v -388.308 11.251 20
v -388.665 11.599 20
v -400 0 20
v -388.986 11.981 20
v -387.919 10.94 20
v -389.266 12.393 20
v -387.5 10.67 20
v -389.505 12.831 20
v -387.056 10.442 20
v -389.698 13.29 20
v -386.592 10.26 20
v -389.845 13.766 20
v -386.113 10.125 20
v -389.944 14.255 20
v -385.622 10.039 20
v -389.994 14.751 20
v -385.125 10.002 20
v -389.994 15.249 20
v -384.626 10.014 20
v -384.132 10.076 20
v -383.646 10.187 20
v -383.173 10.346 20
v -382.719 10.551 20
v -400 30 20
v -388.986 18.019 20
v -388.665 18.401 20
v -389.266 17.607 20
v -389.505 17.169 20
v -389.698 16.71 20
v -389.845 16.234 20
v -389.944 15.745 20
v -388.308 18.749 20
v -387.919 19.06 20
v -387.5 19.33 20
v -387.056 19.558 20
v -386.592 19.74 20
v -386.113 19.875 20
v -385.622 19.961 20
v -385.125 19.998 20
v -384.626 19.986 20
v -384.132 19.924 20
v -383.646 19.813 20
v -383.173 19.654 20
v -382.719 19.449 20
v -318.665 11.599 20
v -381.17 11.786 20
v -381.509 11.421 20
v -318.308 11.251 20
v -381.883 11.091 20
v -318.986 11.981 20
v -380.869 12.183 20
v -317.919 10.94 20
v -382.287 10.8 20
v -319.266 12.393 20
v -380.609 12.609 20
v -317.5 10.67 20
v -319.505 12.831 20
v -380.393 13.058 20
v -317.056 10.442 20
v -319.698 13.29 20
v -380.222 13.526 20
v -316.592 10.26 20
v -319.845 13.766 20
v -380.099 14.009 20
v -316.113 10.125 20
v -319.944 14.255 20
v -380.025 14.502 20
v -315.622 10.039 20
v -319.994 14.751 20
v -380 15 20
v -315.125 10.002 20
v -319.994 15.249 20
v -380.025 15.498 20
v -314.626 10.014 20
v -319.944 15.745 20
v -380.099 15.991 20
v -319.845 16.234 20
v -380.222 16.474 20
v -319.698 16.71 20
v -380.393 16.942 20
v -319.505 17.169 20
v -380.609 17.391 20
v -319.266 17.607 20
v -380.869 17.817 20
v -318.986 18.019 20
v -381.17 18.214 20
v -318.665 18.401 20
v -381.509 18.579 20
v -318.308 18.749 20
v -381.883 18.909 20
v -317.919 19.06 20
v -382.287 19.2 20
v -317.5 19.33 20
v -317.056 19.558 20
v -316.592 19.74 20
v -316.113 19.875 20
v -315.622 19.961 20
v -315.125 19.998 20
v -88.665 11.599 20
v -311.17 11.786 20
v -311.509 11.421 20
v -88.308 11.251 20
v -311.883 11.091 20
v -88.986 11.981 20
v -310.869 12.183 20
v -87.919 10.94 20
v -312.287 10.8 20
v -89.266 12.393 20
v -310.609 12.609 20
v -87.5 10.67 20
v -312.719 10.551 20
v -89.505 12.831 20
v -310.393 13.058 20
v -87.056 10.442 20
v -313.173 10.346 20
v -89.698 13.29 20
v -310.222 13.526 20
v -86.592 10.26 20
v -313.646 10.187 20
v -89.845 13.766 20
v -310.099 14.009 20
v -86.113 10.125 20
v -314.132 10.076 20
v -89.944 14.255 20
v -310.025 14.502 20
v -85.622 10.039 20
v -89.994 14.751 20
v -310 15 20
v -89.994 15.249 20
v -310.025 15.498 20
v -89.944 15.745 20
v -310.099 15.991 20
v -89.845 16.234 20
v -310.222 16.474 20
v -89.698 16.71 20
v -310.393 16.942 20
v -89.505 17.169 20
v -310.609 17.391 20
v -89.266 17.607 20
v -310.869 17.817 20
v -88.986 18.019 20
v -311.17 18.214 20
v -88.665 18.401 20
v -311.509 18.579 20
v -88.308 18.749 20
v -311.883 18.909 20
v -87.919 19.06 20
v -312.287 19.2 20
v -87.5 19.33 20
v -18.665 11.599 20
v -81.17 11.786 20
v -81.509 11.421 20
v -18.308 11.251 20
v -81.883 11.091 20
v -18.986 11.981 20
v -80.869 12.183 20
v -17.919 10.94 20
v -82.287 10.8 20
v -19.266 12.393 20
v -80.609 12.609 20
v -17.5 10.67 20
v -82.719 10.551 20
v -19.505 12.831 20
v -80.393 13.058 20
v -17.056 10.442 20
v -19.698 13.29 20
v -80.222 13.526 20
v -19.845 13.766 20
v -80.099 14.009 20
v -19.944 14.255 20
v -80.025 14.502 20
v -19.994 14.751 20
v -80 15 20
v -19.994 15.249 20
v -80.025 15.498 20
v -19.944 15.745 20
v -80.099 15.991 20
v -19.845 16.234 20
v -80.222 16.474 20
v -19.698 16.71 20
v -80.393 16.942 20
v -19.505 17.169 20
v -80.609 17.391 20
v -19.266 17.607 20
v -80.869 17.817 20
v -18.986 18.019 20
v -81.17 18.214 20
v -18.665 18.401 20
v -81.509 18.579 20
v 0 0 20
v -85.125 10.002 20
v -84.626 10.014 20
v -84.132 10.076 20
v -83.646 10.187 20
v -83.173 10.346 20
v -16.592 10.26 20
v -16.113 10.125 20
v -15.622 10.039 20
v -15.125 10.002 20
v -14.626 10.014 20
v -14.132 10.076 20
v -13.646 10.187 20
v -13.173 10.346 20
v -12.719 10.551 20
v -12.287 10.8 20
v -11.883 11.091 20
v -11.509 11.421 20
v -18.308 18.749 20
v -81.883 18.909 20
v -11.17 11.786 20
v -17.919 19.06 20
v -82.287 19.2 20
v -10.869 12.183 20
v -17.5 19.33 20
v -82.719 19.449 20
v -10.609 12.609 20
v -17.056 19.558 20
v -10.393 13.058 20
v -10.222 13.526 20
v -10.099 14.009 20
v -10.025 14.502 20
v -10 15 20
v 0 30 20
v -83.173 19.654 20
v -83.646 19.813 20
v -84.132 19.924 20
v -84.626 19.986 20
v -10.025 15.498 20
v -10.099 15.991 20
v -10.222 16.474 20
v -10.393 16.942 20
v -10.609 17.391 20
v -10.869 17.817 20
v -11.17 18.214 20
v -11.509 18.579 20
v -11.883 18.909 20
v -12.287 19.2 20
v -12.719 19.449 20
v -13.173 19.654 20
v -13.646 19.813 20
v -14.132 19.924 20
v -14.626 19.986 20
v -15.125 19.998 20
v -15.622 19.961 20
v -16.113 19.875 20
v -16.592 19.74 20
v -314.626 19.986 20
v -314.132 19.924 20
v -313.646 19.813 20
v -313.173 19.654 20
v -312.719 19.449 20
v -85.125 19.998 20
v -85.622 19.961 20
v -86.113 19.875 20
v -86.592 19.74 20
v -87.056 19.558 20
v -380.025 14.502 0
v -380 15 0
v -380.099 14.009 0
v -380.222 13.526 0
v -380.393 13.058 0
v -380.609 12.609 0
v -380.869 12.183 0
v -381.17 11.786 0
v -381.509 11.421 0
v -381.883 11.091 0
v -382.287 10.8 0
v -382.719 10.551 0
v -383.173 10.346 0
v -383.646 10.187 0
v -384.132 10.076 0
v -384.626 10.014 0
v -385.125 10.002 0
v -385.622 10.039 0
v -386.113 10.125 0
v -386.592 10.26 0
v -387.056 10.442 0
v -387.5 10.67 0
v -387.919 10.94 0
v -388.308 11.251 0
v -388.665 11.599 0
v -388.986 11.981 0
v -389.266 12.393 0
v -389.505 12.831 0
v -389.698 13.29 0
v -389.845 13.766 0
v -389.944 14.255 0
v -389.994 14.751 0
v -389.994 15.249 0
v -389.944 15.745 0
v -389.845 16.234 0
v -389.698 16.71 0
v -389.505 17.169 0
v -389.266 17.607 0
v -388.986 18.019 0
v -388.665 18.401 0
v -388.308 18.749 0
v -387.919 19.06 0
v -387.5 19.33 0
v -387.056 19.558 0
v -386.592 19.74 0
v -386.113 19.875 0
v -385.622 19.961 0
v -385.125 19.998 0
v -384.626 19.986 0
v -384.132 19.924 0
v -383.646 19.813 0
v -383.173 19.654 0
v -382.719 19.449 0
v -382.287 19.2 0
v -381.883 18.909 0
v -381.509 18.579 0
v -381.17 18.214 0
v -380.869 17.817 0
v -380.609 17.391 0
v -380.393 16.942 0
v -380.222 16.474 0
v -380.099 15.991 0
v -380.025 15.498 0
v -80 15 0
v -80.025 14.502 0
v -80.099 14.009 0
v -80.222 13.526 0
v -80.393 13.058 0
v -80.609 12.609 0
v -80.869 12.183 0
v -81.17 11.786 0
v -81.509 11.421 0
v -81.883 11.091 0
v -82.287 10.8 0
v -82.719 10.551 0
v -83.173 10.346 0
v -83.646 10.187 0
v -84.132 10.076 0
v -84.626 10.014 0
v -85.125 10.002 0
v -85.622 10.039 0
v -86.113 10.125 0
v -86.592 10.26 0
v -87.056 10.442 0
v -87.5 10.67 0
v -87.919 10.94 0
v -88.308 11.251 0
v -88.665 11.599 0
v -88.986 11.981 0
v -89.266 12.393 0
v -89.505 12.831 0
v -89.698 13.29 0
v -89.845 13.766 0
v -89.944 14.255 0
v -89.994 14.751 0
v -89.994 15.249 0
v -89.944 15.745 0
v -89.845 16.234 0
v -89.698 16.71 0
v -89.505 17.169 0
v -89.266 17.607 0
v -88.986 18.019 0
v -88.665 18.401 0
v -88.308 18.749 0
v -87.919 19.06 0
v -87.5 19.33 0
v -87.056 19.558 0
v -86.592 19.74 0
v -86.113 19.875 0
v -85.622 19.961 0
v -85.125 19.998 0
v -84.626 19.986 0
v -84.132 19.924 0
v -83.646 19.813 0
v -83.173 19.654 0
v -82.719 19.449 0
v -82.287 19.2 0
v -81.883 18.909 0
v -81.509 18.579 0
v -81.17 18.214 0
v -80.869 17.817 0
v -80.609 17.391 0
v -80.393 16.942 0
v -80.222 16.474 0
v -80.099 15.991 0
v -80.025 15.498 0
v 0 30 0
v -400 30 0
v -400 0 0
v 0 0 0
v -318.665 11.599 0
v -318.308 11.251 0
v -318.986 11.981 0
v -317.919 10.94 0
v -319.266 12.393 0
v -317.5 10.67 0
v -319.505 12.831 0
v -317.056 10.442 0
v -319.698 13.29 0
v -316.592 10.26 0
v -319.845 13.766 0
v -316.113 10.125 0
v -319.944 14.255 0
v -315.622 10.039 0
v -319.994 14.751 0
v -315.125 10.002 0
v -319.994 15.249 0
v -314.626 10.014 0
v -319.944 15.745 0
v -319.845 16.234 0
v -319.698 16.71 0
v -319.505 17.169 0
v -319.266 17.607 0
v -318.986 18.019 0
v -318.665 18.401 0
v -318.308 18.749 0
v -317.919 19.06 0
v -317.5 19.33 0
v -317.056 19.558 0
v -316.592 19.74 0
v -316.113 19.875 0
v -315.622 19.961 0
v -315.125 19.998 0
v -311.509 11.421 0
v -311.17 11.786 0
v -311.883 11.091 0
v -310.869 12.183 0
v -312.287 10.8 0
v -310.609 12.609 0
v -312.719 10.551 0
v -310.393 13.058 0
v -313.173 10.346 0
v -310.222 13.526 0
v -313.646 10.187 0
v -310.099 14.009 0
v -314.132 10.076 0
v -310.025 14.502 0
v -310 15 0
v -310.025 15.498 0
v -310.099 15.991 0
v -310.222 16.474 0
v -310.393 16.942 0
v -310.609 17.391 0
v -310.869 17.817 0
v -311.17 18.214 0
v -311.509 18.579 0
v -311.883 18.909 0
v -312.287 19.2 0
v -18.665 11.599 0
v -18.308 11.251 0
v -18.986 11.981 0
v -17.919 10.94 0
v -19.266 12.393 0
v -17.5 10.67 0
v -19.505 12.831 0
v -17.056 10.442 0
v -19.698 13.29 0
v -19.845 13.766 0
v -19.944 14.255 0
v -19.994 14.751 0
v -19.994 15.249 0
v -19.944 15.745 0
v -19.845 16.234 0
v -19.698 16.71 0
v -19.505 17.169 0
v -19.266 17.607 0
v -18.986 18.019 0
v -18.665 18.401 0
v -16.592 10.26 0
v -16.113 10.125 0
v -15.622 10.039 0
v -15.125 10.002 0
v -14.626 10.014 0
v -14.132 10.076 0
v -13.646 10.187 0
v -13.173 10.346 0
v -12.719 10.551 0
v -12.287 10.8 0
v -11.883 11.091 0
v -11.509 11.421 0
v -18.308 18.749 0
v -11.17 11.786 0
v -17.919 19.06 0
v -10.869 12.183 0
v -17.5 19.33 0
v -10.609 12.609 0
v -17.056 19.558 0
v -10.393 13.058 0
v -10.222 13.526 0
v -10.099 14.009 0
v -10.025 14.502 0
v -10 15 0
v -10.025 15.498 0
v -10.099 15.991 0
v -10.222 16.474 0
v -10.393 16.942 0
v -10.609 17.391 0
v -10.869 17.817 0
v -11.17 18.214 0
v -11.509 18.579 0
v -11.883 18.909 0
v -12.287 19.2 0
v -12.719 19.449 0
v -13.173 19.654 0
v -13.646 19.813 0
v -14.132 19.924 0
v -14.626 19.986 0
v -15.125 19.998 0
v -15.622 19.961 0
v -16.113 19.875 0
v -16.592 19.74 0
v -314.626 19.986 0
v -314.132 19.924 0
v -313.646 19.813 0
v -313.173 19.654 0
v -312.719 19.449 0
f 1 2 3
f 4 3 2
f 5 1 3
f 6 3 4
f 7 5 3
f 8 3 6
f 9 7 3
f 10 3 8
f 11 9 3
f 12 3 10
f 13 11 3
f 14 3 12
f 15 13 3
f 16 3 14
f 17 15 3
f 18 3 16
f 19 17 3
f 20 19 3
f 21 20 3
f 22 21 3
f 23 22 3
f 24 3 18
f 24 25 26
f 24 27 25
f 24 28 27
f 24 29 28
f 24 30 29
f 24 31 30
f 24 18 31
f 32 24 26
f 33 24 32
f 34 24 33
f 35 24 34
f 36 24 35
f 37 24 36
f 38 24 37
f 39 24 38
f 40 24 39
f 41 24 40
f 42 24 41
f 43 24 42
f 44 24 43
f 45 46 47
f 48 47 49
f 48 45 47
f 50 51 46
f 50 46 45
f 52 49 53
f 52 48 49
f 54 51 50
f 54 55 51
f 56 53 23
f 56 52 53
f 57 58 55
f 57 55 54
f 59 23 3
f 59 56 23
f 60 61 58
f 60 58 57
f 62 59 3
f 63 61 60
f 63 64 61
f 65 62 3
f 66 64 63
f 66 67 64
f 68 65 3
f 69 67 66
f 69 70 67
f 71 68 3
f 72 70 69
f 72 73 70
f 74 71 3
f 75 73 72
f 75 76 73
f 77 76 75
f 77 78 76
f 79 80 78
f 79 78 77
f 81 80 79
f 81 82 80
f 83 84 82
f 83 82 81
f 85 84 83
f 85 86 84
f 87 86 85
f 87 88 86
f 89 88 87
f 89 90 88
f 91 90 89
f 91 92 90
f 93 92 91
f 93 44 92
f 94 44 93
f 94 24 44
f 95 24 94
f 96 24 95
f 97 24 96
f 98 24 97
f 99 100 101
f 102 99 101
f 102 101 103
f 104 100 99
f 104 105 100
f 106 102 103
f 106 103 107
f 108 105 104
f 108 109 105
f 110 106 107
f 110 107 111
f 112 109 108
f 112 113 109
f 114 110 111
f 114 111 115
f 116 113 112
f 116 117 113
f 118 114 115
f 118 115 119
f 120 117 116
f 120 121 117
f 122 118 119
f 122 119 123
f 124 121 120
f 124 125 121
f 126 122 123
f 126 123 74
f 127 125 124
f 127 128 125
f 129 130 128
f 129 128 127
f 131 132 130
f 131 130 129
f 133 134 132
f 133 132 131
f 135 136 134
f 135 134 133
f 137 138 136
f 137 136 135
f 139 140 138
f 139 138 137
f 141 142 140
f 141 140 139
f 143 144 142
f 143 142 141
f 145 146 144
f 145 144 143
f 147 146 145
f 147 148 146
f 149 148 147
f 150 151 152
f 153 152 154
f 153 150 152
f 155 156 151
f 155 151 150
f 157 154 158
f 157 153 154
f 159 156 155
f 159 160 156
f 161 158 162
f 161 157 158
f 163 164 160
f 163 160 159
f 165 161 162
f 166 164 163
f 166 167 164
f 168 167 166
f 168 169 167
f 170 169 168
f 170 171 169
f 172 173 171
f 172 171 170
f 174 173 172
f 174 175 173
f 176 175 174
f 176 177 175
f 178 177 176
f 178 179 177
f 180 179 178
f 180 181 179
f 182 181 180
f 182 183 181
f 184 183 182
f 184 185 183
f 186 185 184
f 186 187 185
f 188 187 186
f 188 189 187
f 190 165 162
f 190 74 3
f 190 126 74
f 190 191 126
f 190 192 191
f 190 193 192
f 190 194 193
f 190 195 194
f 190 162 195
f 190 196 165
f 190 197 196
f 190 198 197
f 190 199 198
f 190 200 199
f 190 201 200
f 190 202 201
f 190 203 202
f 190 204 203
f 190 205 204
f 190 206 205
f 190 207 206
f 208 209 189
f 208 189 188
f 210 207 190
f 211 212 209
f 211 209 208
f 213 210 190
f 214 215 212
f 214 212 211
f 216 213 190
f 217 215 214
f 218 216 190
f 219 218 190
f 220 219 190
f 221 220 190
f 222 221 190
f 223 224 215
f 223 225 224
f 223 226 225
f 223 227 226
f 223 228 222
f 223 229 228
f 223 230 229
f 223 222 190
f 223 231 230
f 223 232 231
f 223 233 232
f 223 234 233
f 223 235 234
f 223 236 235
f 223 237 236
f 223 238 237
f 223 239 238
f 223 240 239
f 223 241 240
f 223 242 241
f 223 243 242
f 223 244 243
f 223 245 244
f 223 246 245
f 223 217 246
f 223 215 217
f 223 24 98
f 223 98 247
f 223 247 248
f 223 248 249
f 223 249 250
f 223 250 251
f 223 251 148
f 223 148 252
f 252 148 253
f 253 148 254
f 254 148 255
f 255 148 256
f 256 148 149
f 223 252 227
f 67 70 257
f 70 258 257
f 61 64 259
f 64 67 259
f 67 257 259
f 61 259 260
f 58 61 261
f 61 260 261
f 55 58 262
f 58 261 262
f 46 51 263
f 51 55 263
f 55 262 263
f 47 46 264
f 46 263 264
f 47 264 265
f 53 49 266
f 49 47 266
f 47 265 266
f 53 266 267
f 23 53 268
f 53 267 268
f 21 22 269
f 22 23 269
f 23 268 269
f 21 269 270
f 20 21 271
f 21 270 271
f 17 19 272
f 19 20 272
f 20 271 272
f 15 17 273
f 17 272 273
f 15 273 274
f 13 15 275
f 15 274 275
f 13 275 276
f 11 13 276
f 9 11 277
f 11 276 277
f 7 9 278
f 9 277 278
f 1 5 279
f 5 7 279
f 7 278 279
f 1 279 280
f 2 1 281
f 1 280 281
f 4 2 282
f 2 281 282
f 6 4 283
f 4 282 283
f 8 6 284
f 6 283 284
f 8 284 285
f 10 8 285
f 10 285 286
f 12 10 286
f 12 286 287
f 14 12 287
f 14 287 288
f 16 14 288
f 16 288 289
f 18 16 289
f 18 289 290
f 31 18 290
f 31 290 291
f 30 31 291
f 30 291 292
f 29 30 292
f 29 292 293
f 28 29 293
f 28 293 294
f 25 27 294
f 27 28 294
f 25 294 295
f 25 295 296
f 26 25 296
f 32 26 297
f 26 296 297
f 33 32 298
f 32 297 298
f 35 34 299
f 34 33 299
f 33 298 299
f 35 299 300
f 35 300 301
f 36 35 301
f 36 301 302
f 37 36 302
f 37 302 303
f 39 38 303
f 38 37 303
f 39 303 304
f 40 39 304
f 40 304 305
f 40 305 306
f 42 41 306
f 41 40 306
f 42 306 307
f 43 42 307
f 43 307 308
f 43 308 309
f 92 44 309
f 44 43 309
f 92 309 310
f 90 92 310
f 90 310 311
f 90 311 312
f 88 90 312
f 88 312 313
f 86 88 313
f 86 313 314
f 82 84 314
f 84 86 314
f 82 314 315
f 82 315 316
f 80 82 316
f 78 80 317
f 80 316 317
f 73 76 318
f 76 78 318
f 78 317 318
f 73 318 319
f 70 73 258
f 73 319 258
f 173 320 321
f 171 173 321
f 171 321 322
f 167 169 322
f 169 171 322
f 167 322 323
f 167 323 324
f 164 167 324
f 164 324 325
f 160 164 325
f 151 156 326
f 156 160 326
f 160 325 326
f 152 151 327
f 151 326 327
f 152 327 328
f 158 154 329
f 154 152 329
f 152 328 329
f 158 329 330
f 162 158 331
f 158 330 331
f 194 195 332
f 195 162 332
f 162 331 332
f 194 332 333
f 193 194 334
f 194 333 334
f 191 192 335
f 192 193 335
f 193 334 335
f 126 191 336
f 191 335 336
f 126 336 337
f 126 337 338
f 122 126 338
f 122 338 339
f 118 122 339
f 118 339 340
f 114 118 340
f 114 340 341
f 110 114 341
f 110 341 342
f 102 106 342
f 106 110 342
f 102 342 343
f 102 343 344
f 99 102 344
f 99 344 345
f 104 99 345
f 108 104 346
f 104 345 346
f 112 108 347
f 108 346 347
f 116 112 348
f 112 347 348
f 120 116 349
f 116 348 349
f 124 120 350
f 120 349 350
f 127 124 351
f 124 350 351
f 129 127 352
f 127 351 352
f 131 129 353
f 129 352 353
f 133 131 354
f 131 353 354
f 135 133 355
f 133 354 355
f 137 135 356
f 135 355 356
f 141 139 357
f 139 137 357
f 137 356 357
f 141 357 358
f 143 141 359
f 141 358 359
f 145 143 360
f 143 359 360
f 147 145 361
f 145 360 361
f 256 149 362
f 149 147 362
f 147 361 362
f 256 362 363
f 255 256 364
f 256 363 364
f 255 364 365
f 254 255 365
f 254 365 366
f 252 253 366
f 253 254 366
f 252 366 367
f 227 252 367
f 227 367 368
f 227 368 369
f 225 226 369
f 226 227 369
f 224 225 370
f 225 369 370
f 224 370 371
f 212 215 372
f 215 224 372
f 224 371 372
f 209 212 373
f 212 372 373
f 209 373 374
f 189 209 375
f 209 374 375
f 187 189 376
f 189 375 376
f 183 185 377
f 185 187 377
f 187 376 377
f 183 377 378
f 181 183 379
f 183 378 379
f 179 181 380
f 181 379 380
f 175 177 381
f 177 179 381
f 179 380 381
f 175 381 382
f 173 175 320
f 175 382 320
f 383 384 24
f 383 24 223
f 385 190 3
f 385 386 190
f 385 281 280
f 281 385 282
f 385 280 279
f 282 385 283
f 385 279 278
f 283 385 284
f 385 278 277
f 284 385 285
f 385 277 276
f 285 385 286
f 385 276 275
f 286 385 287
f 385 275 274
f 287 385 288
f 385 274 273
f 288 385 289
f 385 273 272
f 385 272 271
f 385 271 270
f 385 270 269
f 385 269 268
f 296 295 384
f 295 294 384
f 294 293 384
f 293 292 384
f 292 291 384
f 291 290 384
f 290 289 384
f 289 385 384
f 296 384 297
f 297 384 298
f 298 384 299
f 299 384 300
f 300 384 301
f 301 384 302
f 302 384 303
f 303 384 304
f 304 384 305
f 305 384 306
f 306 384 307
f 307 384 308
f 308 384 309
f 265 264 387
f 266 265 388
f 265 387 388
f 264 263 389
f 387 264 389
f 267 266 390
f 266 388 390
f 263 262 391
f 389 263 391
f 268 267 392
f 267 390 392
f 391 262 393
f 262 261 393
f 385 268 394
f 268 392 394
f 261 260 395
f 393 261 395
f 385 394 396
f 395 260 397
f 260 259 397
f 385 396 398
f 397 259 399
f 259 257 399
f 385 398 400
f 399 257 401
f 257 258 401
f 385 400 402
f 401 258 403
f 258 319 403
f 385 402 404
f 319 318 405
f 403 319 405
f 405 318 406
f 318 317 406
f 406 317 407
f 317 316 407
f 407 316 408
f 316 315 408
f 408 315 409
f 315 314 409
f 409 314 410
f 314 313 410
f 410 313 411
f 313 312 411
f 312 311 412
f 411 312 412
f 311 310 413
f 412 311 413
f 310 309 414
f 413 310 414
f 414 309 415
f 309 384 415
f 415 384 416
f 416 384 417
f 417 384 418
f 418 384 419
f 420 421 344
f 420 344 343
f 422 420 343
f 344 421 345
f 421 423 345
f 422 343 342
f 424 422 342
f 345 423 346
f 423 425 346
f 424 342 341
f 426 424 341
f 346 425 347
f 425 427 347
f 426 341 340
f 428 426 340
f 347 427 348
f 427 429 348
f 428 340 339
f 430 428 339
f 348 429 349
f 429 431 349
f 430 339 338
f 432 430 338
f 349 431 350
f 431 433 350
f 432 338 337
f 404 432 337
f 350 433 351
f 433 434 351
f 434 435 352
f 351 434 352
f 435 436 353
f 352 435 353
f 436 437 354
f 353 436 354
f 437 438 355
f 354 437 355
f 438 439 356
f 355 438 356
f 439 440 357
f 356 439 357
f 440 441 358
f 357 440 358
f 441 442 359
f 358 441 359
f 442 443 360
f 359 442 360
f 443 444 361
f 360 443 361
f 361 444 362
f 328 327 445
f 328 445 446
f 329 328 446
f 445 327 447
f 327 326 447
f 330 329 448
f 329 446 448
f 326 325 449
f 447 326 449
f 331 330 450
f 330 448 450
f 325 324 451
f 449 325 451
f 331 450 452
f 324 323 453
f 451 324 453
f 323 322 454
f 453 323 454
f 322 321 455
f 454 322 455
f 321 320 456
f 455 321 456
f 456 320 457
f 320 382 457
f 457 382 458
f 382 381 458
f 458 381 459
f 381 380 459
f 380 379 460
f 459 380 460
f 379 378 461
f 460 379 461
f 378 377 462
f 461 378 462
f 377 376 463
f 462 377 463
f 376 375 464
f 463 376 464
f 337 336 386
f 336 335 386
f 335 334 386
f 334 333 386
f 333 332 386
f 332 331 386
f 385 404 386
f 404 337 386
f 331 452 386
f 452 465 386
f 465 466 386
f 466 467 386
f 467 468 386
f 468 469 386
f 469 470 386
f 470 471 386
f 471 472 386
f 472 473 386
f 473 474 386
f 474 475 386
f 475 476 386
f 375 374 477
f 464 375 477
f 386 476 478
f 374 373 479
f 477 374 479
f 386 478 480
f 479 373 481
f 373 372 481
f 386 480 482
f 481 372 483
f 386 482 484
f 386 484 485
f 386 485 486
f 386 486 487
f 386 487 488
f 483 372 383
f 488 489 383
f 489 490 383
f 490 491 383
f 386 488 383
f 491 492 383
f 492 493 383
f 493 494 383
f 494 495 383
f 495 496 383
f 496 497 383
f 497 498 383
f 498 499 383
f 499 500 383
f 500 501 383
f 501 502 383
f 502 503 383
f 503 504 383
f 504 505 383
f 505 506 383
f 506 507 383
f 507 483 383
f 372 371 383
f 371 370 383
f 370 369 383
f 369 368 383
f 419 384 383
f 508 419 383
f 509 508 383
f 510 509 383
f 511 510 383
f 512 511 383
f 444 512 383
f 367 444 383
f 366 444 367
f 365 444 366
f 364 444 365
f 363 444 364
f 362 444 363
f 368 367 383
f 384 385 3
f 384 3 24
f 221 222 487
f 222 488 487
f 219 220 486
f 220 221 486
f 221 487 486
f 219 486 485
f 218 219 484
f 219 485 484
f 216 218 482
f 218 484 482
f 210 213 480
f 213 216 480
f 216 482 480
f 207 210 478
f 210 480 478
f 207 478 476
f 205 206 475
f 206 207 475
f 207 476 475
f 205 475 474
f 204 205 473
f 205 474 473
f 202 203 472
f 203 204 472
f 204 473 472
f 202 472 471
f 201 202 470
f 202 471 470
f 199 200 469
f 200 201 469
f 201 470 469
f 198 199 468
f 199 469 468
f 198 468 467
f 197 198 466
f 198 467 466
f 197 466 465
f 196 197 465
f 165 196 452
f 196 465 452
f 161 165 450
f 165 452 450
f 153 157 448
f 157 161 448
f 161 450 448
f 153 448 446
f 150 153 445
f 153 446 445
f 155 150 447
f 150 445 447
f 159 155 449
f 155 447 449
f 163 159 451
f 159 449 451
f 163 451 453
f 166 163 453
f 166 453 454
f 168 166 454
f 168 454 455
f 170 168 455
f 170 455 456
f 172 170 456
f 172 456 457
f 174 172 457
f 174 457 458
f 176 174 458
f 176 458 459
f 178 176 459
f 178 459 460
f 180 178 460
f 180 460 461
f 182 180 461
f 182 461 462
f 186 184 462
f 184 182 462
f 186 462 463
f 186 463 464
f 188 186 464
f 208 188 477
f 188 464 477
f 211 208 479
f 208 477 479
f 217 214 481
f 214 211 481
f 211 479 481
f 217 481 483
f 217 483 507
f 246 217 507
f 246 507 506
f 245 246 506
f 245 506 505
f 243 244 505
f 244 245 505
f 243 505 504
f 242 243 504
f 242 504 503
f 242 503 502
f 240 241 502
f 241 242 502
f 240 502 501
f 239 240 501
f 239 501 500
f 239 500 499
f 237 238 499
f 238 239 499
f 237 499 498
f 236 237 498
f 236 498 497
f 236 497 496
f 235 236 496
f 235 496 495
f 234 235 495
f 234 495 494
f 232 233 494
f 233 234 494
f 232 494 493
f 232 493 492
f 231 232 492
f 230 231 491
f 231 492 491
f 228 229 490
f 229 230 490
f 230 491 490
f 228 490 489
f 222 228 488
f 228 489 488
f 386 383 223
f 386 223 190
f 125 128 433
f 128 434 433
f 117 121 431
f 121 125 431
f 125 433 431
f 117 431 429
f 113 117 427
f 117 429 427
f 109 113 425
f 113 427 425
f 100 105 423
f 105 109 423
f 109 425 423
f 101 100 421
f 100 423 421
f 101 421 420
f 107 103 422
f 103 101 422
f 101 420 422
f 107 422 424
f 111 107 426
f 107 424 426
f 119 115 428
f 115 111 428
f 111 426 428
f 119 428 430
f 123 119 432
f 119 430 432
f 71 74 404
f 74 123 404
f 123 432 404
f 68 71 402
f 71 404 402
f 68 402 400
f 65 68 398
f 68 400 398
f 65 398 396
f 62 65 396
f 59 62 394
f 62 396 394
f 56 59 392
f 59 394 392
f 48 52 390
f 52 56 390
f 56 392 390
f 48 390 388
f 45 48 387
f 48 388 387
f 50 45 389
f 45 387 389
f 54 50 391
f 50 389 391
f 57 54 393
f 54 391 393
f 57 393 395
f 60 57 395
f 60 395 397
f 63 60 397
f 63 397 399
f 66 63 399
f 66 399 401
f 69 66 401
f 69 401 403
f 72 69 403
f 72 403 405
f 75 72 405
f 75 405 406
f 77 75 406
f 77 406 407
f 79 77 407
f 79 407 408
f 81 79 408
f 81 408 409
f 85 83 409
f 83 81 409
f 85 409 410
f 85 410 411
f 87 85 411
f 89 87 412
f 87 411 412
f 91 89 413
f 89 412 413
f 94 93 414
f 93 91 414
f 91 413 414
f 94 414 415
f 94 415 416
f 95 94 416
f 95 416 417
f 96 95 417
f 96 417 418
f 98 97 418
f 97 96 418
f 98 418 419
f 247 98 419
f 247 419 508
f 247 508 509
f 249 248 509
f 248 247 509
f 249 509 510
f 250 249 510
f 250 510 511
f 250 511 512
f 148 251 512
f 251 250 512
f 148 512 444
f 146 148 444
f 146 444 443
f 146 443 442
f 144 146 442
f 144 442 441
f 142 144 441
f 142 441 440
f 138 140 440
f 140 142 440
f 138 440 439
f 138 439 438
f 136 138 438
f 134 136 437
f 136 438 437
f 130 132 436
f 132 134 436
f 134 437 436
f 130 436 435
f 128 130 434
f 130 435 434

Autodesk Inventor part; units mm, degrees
ref_plane "YZ Plane" through (0, 0, 0) normal (1, 0, 0) x (0, 1, 0)
ref_plane "XZ Plane" through (0, 0, 0) normal (0, 1, 0) x (-1, 0, 0)
ref_plane "XY Plane" through (0, 0, 0) normal (0, 0, 1) x (1, 0, 0)
sketch "Sketch1" plane through (0, 0, 0) normal (0, 0, 1) x (1, 0, 0)
  line L0 (0, 0) -> (-400, 0)
  line L1 (-400, 0) -> (-400, 30)
  line L2 (-400, 30) -> (0, 30)
  line L3 (0, 30) -> (0, 0)
  circle A0 centre (-15, 15) radius 5
  circle A1 centre (-85, 15) radius 5
  circle A2 centre (-315, 15) radius 5
  circle A3 centre (-385, 15) radius 5
  dimension "d0" = 400
  dimension "d1" = 30
  dimension "d2" = 10
  dimension "d3" = 10
  dimension "d4" = 10
  dimension "d5" = 10
  dimension "d6" = 15
  dimension "d7" = 15
  dimension "d8" = 15
  dimension "d9" = 70
  dimension "d10" = 15
  dimension "d11" = 15
  dimension "d12" = 70
  dimension "d13" = 15
sketch "Sketch2" plane through (0, 0, 0) normal (0, 0, 1) x (1, 0, 0)
  point P0 (0, 0)
extrude "Extrusion1" add sketch "Sketch1" along normal blind 20
properties part number "seatButtSidePlate" material "Wood (Birch)"
